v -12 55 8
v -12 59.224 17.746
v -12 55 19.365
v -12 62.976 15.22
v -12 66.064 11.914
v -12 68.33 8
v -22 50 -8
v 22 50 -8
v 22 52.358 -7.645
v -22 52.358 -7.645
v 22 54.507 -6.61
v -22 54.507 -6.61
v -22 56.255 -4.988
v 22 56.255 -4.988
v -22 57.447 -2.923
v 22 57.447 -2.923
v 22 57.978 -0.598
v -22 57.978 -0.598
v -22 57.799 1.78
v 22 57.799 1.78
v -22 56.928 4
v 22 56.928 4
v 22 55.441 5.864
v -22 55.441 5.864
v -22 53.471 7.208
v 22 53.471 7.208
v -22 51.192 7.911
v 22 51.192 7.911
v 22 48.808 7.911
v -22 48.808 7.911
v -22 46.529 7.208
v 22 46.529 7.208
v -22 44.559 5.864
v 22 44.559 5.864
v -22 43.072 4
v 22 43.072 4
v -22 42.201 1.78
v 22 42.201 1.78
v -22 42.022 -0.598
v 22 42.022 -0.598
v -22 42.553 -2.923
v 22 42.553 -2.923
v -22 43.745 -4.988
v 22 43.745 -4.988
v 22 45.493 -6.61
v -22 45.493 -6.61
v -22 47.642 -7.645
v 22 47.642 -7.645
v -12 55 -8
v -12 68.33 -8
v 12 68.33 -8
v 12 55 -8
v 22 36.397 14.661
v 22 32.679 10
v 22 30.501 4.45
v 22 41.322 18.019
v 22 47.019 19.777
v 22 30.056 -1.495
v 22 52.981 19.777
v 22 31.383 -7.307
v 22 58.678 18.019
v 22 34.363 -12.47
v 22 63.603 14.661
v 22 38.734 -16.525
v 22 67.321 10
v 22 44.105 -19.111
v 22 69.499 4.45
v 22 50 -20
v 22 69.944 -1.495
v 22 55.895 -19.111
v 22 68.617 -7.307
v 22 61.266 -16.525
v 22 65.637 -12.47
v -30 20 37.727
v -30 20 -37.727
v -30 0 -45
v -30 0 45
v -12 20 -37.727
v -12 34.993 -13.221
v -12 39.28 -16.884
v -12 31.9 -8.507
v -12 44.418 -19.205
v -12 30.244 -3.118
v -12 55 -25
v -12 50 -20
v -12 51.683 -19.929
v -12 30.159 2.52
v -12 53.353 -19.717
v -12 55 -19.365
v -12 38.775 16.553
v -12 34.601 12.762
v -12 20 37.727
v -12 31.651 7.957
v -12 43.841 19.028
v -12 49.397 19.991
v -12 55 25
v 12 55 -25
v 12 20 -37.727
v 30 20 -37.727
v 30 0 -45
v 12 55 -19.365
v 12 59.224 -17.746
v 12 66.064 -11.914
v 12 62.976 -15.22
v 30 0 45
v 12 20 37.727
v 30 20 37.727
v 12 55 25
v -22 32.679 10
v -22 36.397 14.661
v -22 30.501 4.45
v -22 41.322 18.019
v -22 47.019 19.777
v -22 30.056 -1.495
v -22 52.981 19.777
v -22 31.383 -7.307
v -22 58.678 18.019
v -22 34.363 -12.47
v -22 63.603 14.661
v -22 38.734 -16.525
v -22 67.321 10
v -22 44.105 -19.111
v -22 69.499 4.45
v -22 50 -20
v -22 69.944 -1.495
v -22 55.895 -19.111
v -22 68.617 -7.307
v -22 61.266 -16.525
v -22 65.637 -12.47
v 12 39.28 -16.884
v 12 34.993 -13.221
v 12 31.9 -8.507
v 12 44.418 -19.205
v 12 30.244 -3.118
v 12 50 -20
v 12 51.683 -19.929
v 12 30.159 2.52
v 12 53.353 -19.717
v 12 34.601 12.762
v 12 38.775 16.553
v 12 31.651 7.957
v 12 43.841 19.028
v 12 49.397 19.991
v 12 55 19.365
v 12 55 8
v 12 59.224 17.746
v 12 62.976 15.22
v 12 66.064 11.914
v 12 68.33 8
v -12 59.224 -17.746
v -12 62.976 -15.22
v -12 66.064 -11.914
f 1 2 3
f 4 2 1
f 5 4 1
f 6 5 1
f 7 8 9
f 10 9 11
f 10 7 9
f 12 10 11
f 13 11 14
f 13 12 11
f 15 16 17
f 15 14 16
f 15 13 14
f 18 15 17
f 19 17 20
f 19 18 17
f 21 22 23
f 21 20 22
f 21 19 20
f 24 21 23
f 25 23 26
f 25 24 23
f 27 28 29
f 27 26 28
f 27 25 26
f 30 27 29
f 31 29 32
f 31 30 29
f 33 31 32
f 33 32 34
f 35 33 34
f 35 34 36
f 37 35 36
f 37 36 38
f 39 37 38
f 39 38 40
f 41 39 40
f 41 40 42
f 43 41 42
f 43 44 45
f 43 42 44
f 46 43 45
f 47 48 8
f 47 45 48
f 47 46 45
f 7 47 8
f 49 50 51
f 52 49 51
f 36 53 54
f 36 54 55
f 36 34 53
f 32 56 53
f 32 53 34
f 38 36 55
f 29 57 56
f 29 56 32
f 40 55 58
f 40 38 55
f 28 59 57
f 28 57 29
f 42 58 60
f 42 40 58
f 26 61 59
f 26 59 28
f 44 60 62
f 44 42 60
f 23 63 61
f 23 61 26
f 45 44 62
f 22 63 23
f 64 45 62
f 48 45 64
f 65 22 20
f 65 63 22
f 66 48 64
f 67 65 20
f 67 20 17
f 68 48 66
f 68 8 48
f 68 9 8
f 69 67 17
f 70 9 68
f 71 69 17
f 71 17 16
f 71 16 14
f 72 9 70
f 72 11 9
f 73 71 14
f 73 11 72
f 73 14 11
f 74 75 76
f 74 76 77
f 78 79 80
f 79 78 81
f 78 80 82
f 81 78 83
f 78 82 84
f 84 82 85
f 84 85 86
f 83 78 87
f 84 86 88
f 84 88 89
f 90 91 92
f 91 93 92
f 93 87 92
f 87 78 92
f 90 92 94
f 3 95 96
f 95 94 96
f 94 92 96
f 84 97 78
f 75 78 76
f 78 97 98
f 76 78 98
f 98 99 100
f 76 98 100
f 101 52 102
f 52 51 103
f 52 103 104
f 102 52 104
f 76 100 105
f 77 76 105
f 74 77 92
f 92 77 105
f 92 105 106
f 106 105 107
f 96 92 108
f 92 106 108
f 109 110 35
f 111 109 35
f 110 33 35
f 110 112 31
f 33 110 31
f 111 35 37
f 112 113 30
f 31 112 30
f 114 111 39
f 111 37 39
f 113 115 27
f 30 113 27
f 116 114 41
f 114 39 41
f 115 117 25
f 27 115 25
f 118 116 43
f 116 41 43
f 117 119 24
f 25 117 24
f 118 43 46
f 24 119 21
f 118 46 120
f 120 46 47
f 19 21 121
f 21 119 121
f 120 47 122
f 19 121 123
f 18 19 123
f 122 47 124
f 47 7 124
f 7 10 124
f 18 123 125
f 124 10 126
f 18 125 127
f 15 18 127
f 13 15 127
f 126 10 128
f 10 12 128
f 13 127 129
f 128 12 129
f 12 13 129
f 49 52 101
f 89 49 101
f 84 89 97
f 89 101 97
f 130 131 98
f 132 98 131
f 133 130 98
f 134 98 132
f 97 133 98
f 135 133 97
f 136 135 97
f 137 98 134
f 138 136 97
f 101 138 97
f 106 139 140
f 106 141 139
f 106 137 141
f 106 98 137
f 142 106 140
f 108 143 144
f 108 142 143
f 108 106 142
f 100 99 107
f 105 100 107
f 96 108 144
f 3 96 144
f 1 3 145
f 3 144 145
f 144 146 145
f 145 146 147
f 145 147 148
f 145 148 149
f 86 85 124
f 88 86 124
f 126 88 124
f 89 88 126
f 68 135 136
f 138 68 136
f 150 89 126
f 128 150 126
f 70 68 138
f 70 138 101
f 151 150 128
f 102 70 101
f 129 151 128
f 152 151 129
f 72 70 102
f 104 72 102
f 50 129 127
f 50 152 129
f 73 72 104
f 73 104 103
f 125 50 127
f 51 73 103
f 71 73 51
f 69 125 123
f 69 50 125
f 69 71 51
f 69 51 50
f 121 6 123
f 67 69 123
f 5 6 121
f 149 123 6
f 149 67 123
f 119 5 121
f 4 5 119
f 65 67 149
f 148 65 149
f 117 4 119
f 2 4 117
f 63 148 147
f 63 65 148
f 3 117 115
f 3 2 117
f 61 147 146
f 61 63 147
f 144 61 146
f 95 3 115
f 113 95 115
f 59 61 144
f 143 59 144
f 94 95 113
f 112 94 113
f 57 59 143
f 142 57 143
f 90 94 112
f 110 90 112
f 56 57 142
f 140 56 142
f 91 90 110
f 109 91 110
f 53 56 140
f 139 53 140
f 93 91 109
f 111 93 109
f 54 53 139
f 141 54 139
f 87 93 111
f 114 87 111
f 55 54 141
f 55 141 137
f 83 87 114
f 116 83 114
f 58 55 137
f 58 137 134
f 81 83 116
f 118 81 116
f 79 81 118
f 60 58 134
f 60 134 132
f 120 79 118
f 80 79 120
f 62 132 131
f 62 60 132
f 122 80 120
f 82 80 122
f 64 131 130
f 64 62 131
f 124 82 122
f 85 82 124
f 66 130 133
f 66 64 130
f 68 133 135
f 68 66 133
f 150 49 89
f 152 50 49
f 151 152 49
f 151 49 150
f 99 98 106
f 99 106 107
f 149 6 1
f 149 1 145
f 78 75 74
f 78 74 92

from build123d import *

# Parameters (mm, degrees)
SALIENTE_EXTRUIR1_DEPTH    = 30
CROQUIS2_W                 = 18
CROQUIS2_H                 = 35
CORTAR_EXTRUIR1_DEPTH      = 110.658560997
CROQUIS3_R                 = 20
SALIENTE_EXTRUIR2_DEPTH    = 22
CORTAR_EXTRUIR2_DEPTH      = 89.459030065
CORTAR_EXTRUIR2_DEPTH_BACK = 89.459030065
CROQUIS3_3_R               = 8
CROQUIS4_W                 = 24
CROQUIS4_H                 = 17
CORTAR_EXTRUIR4_DEPTH      = 15


with BuildPart() as part:
    # Croquis1 → Saliente-Extruir1 (new, symmetric)
    with BuildSketch(Plane(origin=(0, 0, 0), x_dir=(0, 0, -1), z_dir=(1, 0, 0))):
        Polygon((45, 0), (-45, 0), (-25, 55), (25, 55), align=None)
    extrude(amount=SALIENTE_EXTRUIR1_DEPTH, both=True)

    # Croquis2 → Cortar-Extruir1 (cut, through all)
    with BuildSketch(Plane.XY.offset(45)):
        with Locations((-21, 37.5)):
            Rectangle(CROQUIS2_W, CROQUIS2_H)
        with Locations((21, 37.5)):
            Rectangle(CROQUIS2_W, CROQUIS2_H)
    extrude(amount=-CORTAR_EXTRUIR1_DEPTH, mode=Mode.SUBTRACT)

    # Croquis3 → Saliente-Extruir2 (add, symmetric)
    with BuildSketch(Plane(origin=(0, 0, 0), x_dir=(0, 0, -1), z_dir=(1, 0, 0))):
        with Locations((0, 50)):
            Circle(CROQUIS3_R)
    extrude(amount=SALIENTE_EXTRUIR2_DEPTH, both=True)

    # Croquis3<3> → Cortar-Extruir2 (cut, two sides: drawn at the far end of the back side and taken through both)
    with BuildSketch(Plane(origin=(0, 0, 0), x_dir=(0, 0, -1), z_dir=(1, 0, 0)).offset(-CORTAR_EXTRUIR2_DEPTH_BACK)):
        with Locations((0, 50)):
            Circle(CROQUIS3_3_R)
    extrude(amount=CORTAR_EXTRUIR2_DEPTH + CORTAR_EXTRUIR2_DEPTH_BACK, mode=Mode.SUBTRACT)

    # Croquis4 → Cortar-Extruir4 (cut)
    with BuildSketch(Plane(origin=(0, 70, 0), x_dir=(1, 0, 0), z_dir=(0, 1, 0))):
        with Locations((0, -16.5)):
            Rectangle(CROQUIS4_W, CROQUIS4_H)
        with Locations((0, 16.5)):
            Rectangle(CROQUIS4_W, CROQUIS4_H)
    extrude(amount=-CORTAR_EXTRUIR4_DEPTH, mode=Mode.SUBTRACT)


solid = part.part
